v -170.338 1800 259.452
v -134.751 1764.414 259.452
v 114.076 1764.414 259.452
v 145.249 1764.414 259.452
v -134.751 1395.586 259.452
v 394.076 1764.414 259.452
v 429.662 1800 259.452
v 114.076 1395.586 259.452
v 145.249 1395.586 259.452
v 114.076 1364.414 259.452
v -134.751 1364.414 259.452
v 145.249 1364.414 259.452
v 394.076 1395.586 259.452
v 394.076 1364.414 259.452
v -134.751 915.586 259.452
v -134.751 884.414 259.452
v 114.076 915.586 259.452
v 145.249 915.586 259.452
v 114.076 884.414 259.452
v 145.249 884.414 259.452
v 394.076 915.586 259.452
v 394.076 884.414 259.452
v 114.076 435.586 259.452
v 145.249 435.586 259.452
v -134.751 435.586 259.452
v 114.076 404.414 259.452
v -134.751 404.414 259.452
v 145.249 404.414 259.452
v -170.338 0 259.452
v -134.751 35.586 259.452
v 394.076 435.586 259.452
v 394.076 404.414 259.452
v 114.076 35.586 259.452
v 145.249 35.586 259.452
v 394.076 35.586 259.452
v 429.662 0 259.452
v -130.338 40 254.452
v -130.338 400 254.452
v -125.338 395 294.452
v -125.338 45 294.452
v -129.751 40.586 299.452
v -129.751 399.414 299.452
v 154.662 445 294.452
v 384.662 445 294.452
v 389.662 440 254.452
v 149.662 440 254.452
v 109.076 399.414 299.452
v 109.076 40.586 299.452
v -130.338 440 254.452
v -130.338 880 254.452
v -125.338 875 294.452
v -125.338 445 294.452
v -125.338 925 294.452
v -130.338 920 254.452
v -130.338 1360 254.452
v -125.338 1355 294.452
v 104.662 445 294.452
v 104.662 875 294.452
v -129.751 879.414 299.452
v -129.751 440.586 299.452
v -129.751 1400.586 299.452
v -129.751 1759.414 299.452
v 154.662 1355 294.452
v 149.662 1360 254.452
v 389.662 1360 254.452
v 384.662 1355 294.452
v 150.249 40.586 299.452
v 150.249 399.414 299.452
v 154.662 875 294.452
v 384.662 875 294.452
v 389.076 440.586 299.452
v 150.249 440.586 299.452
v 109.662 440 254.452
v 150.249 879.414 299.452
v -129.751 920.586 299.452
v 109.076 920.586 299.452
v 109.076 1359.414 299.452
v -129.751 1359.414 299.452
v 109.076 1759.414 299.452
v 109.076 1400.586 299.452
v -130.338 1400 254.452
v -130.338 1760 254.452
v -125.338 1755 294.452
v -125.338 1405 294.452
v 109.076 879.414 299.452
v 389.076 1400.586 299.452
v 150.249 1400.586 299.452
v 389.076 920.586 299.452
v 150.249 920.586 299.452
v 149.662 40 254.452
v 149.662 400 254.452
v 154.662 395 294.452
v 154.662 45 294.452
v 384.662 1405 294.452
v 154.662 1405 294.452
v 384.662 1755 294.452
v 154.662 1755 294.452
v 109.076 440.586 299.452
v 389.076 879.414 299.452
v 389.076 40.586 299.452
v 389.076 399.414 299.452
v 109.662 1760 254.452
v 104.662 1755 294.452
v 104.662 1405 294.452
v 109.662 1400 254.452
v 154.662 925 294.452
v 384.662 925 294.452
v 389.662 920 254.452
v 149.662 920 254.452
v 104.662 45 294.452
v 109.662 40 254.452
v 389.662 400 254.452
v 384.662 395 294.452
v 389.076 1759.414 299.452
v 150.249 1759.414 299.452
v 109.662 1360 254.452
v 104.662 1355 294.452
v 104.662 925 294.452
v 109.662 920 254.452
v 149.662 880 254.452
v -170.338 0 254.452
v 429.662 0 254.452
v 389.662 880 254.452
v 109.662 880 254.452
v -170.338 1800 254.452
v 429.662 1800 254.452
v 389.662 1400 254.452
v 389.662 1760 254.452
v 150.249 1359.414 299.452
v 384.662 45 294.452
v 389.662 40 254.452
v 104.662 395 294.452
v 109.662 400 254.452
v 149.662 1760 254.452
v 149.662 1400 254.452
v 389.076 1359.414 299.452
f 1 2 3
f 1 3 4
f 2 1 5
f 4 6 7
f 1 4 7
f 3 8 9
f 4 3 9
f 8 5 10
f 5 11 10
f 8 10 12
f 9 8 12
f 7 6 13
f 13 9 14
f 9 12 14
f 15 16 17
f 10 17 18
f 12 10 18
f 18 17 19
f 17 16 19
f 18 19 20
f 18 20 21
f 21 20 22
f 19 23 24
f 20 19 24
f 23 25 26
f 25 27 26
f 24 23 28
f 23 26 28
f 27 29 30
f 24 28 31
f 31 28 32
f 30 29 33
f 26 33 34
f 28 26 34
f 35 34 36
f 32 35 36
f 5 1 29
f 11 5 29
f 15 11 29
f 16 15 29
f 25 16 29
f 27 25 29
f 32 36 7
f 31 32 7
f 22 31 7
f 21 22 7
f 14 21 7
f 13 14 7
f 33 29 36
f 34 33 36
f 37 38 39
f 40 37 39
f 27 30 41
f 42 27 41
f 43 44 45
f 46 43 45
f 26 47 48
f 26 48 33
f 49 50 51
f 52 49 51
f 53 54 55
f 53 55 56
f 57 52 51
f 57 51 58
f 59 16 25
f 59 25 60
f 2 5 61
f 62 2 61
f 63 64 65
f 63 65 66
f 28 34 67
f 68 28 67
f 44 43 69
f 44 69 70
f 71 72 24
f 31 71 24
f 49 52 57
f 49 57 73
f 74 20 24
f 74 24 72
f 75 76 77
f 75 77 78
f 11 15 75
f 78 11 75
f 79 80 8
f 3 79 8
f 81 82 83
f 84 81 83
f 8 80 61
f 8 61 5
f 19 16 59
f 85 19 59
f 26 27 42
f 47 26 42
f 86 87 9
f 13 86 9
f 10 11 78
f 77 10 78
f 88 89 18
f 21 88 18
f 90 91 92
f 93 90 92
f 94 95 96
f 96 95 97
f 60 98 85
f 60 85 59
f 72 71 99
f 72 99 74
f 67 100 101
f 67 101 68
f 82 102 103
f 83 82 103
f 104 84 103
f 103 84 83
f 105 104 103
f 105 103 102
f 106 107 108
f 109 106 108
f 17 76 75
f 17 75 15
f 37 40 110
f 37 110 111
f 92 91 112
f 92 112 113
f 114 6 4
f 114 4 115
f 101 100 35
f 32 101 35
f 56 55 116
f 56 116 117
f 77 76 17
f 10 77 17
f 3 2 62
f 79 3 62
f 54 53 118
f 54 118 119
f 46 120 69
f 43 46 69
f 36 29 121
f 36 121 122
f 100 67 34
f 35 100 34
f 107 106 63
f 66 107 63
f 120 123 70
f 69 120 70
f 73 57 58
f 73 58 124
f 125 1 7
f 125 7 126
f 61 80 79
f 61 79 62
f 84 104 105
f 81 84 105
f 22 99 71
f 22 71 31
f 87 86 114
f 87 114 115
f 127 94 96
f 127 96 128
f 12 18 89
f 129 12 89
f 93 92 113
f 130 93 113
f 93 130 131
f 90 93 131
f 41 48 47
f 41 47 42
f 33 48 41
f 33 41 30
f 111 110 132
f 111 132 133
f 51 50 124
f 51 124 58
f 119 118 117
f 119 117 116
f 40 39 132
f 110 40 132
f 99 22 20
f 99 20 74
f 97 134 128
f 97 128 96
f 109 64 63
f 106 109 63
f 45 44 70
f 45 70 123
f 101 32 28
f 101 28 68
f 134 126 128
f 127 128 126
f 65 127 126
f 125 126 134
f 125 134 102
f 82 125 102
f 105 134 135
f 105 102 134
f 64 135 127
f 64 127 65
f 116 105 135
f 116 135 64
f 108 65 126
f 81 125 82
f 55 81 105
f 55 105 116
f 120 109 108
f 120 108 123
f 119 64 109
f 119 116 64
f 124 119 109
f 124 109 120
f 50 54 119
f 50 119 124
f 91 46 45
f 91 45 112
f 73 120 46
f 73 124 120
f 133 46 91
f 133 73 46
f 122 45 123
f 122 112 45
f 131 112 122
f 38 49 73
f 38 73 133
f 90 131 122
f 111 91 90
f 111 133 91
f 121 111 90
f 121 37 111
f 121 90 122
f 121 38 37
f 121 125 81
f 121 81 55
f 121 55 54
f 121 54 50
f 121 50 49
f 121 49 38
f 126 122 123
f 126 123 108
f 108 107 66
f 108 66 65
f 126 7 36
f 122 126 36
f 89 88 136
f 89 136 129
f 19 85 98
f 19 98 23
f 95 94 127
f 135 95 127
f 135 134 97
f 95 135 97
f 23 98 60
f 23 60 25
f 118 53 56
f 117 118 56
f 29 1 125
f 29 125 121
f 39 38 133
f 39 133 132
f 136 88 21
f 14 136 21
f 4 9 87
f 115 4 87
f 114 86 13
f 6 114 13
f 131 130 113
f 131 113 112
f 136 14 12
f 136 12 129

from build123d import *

# Parameters (mm, degrees)
F1_DEPTH  = 1800
F3_DEPTH  = 800
F4_DEPTH  = 600
F5_DEPTH  = 600
F6_DEPTH  = 800
F7_DEPTH  = 600
F8_DEPTH  = 1900
F9_DEPTH  = 1900
F10_DEPTH = 1900
F11_DEPTH = 800


with BuildPart() as f1:
    # F0 (on Front) → F1 (new body)
    with BuildSketch(Plane.XZ):
        Polygon((-134.7514528915, 259.4524627924), (-170.3375428915, 259.4524627924), (-170.3375428915, 254.4524627924), (-130.3375428915, 254.4524627924), (-125.3375428915, 294.4524627924), (104.6624571085, 294.4524627924), (109.6624571085, 254.4524627924), (129.6624571085, 254.4524627924), (129.6624571085, 259.4524627924), (114.0763682012, 259.4524627924), (109.0763682012, 299.4524627924), (-129.7514517988, 299.4524627924), align=None)
        Polygon((-170.3375428915, 299.4524627924), (-170.3375428915, 259.4524627924), (-134.7514528915, 259.4524627924), (-129.7514517988, 299.4524627924), align=None)
        Polygon((150.2485460158, 299.4524627924), (109.0763682012, 299.4524627924), (114.0763682012, 259.4524627924), (129.6624571085, 259.4524627924), (145.2485460158, 259.4524627924), align=None)
        Polygon((389.0763660158, 299.4524627924), (150.2485460158, 299.4524627924), (145.2485460158, 259.4524627924), (129.6624571085, 259.4524627924), (129.6624571085, 254.4524627924), (149.6624571085, 254.4524627924), (154.6624571085, 294.4524627924), (384.6624571085, 294.4524627924), (389.6624571085, 254.4524627924), (429.6624571085, 254.4524627924), (429.6624571085, 259.4524627924), (394.0763671085, 259.4524627924), align=None)
        Polygon((429.6624571085, 299.4524627924), (389.0763660158, 299.4524627924), (394.0763671085, 259.4524627924), (429.6624571085, 259.4524627924), align=None)
    extrude(amount=-F1_DEPTH)

    # F2 (on face) → F3 (cut)
    with BuildSketch(Plane(origin=(-170.3375428915, 0, 0), x_dir=(0, -1, 0), z_dir=(-1, 0, 0))):
        Polygon((-1800, 254.4524627924), (-1760, 254.4524627924), (-1759.375, 259.4524627924), (-1755, 294.4524627924), (-1760.0389110927, 294.4524627924), (-1764.4139110927, 259.4524627924), (-1800, 259.4524627924), align=None)
    extrude(amount=-F3_DEPTH, mode=Mode.SUBTRACT)

    # F2 (on face) → F4 (join)
    with BuildSketch(Plane(origin=(-170.3375428915, 0, 0), x_dir=(0, -1, 0), z_dir=(-1, 0, 0))):
        Polygon((-1760.0389110927, 294.4524627924), (-1759.4139110927, 299.4524627924), (-1800, 299.4524627924), (-1800, 259.4524627924), (-1764.4139110927, 259.4524627924), align=None)
    extrude(amount=-F4_DEPTH)

    # F2 (on face) → F5 (join)
    with BuildSketch(Plane(origin=(-170.3375428915, 0, 0), x_dir=(0, -1, 0), z_dir=(-1, 0, 0))):
        Polygon((-1800, 254.4524627924), (-1760, 254.4524627924), (-1759.375, 259.4524627924), (-1755, 294.4524627924), (-1760.0389110927, 294.4524627924), (-1764.4139110927, 259.4524627924), (-1800, 259.4524627924), align=None)
    extrude(amount=-F5_DEPTH)

    # F2 (on face) → F6 (cut)
    with BuildSketch(Plane(origin=(-170.3375428915, 0, 0), x_dir=(0, -1, 0), z_dir=(-1, 0, 0))):
        Polygon((-1400, 254.4524627924), (-1360, 254.4524627924), (-1355, 294.4524627924), (-1360.0389110927, 294.4524627924), (-1364.4139110927, 259.4524627924), (-1395.5860889073, 259.4524627924), (-1399.9610889073, 294.4524627924), (-1405, 294.4524627924), (-1400.625, 259.4524627924), align=None)
        Polygon((-880.0389110927, 294.4524627924), (-879.4139110927, 299.4524627924), (-900, 299.4524627924), (-900, 259.4524627924), (-884.4139110927, 259.4524627924), align=None)
        Polygon((-920, 254.4524627924), (-900, 254.4524627924), (-900, 259.4524627924), (-915.5860889073, 259.4524627924), (-919.9610889073, 294.4524627924), (-925, 294.4524627924), align=None)
        Polygon((-400.0389110927, 294.4524627924), (-399.4139110927, 299.4524627924), (-440.5860889073, 299.4524627924), (-439.9610889073, 294.4524627924), (-435.5860889073, 259.4524627924), (-404.4139110927, 259.4524627924), align=None)
        Polygon((-35.5860889073, 259.4524627924), (0, 259.4524627924), (0, 299.4524627924), (-40.5860889073, 299.4524627924), (-39.9610889073, 294.4524627924), align=None)
    extrude(amount=-F6_DEPTH, mode=Mode.SUBTRACT)

    # F2 (on face) → F7 (join)
    with BuildSketch(Plane(origin=(-170.3375428915, 0, 0), x_dir=(0, -1, 0), z_dir=(-1, 0, 0))):
        Polygon((-40, 254.4524627924), (0, 254.4524627924), (0, 259.4524627924), (-35.5860889073, 259.4524627924), (-39.9610889073, 294.4524627924), (-45, 294.4524627924), (-40.625, 259.4524627924), align=None)
        Polygon((-440, 254.4524627924), (-400, 254.4524627924), (-399.375, 259.4524627924), (-395, 294.4524627924), (-400.0389110927, 294.4524627924), (-404.4139110927, 259.4524627924), (-435.5860889073, 259.4524627924), (-439.9610889073, 294.4524627924), (-445, 294.4524627924), (-440.625, 259.4524627924), align=None)
        Polygon((-920, 254.4524627924), (-900, 254.4524627924), (-900, 259.4524627924), (-915.5860889073, 259.4524627924), (-919.9610889073, 294.4524627924), (-925, 294.4524627924), align=None)
        Polygon((-915.5860889073, 259.4524627924), (-900, 259.4524627924), (-900, 299.4524627924), (-920.5860889073, 299.4524627924), (-919.9610889073, 294.4524627924), align=None)
        Polygon((-900, 254.4524627924), (-880, 254.4524627924), (-879.375, 259.4524627924), (-875, 294.4524627924), (-880.0389110927, 294.4524627924), (-884.4139110927, 259.4524627924), (-900, 259.4524627924), align=None)
        Polygon((-1400, 254.4524627924), (-1360, 254.4524627924), (-1355, 294.4524627924), (-1360.0389110927, 294.4524627924), (-1364.4139110927, 259.4524627924), (-1395.5860889073, 259.4524627924), (-1399.9610889073, 294.4524627924), (-1405, 294.4524627924), (-1400.625, 259.4524627924), align=None)
        Polygon((-1360.0389110927, 294.4524627924), (-1359.4139110927, 299.4524627924), (-1400.5860889073, 299.4524627924), (-1399.9610889073, 294.4524627924), (-1395.5860889073, 259.4524627924), (-1364.4139110927, 259.4524627924), align=None)
    extrude(amount=-F7_DEPTH)

    # F0 (on Front) → F8 (cut)
    with BuildSketch(Plane.XZ):
        Polygon((-170.3375428915, 299.4524627924), (-170.3375428915, 259.4524627924), (-134.7514528915, 259.4524627924), (-129.7514517988, 299.4524627924), align=None)
    extrude(amount=-F8_DEPTH, mode=Mode.SUBTRACT)

    # F0 (on Front) → F9 (cut)
    with BuildSketch(Plane.XZ):
        Polygon((150.2485460158, 299.4524627924), (109.0763682012, 299.4524627924), (114.0763682012, 259.4524627924), (129.6624571085, 259.4524627924), (145.2485460158, 259.4524627924), align=None)
    extrude(amount=-F9_DEPTH, mode=Mode.SUBTRACT)

    # F0 (on Front) → F10 (cut)
    with BuildSketch(Plane.XZ):
        Polygon((429.6624571085, 299.4524627924), (389.0763660158, 299.4524627924), (394.0763671085, 259.4524627924), (429.6624571085, 259.4524627924), align=None)
    extrude(amount=-F10_DEPTH, mode=Mode.SUBTRACT)

    # F2 (on face) → F11 (cut)
    with BuildSketch(Plane(origin=(-170.3375428915, 0, 0), x_dir=(0, -1, 0), z_dir=(-1, 0, 0))):
        Polygon((-1760.0389110927, 294.4524627924), (-1759.4139110927, 299.4524627924), (-1800, 299.4524627924), (-1800, 259.4524627924), (-1764.4139110927, 259.4524627924), align=None)
        Polygon((-1360.0389110927, 294.4524627924), (-1359.4139110927, 299.4524627924), (-1400.5860889073, 299.4524627924), (-1399.9610889073, 294.4524627924), (-1395.5860889073, 259.4524627924), (-1364.4139110927, 259.4524627924), align=None)
        Polygon((-915.5860889073, 259.4524627924), (-900, 259.4524627924), (-900, 299.4524627924), (-920.5860889073, 299.4524627924), (-919.9610889073, 294.4524627924), align=None)
    extrude(amount=-F11_DEPTH, mode=Mode.SUBTRACT)


solid = f1.part
